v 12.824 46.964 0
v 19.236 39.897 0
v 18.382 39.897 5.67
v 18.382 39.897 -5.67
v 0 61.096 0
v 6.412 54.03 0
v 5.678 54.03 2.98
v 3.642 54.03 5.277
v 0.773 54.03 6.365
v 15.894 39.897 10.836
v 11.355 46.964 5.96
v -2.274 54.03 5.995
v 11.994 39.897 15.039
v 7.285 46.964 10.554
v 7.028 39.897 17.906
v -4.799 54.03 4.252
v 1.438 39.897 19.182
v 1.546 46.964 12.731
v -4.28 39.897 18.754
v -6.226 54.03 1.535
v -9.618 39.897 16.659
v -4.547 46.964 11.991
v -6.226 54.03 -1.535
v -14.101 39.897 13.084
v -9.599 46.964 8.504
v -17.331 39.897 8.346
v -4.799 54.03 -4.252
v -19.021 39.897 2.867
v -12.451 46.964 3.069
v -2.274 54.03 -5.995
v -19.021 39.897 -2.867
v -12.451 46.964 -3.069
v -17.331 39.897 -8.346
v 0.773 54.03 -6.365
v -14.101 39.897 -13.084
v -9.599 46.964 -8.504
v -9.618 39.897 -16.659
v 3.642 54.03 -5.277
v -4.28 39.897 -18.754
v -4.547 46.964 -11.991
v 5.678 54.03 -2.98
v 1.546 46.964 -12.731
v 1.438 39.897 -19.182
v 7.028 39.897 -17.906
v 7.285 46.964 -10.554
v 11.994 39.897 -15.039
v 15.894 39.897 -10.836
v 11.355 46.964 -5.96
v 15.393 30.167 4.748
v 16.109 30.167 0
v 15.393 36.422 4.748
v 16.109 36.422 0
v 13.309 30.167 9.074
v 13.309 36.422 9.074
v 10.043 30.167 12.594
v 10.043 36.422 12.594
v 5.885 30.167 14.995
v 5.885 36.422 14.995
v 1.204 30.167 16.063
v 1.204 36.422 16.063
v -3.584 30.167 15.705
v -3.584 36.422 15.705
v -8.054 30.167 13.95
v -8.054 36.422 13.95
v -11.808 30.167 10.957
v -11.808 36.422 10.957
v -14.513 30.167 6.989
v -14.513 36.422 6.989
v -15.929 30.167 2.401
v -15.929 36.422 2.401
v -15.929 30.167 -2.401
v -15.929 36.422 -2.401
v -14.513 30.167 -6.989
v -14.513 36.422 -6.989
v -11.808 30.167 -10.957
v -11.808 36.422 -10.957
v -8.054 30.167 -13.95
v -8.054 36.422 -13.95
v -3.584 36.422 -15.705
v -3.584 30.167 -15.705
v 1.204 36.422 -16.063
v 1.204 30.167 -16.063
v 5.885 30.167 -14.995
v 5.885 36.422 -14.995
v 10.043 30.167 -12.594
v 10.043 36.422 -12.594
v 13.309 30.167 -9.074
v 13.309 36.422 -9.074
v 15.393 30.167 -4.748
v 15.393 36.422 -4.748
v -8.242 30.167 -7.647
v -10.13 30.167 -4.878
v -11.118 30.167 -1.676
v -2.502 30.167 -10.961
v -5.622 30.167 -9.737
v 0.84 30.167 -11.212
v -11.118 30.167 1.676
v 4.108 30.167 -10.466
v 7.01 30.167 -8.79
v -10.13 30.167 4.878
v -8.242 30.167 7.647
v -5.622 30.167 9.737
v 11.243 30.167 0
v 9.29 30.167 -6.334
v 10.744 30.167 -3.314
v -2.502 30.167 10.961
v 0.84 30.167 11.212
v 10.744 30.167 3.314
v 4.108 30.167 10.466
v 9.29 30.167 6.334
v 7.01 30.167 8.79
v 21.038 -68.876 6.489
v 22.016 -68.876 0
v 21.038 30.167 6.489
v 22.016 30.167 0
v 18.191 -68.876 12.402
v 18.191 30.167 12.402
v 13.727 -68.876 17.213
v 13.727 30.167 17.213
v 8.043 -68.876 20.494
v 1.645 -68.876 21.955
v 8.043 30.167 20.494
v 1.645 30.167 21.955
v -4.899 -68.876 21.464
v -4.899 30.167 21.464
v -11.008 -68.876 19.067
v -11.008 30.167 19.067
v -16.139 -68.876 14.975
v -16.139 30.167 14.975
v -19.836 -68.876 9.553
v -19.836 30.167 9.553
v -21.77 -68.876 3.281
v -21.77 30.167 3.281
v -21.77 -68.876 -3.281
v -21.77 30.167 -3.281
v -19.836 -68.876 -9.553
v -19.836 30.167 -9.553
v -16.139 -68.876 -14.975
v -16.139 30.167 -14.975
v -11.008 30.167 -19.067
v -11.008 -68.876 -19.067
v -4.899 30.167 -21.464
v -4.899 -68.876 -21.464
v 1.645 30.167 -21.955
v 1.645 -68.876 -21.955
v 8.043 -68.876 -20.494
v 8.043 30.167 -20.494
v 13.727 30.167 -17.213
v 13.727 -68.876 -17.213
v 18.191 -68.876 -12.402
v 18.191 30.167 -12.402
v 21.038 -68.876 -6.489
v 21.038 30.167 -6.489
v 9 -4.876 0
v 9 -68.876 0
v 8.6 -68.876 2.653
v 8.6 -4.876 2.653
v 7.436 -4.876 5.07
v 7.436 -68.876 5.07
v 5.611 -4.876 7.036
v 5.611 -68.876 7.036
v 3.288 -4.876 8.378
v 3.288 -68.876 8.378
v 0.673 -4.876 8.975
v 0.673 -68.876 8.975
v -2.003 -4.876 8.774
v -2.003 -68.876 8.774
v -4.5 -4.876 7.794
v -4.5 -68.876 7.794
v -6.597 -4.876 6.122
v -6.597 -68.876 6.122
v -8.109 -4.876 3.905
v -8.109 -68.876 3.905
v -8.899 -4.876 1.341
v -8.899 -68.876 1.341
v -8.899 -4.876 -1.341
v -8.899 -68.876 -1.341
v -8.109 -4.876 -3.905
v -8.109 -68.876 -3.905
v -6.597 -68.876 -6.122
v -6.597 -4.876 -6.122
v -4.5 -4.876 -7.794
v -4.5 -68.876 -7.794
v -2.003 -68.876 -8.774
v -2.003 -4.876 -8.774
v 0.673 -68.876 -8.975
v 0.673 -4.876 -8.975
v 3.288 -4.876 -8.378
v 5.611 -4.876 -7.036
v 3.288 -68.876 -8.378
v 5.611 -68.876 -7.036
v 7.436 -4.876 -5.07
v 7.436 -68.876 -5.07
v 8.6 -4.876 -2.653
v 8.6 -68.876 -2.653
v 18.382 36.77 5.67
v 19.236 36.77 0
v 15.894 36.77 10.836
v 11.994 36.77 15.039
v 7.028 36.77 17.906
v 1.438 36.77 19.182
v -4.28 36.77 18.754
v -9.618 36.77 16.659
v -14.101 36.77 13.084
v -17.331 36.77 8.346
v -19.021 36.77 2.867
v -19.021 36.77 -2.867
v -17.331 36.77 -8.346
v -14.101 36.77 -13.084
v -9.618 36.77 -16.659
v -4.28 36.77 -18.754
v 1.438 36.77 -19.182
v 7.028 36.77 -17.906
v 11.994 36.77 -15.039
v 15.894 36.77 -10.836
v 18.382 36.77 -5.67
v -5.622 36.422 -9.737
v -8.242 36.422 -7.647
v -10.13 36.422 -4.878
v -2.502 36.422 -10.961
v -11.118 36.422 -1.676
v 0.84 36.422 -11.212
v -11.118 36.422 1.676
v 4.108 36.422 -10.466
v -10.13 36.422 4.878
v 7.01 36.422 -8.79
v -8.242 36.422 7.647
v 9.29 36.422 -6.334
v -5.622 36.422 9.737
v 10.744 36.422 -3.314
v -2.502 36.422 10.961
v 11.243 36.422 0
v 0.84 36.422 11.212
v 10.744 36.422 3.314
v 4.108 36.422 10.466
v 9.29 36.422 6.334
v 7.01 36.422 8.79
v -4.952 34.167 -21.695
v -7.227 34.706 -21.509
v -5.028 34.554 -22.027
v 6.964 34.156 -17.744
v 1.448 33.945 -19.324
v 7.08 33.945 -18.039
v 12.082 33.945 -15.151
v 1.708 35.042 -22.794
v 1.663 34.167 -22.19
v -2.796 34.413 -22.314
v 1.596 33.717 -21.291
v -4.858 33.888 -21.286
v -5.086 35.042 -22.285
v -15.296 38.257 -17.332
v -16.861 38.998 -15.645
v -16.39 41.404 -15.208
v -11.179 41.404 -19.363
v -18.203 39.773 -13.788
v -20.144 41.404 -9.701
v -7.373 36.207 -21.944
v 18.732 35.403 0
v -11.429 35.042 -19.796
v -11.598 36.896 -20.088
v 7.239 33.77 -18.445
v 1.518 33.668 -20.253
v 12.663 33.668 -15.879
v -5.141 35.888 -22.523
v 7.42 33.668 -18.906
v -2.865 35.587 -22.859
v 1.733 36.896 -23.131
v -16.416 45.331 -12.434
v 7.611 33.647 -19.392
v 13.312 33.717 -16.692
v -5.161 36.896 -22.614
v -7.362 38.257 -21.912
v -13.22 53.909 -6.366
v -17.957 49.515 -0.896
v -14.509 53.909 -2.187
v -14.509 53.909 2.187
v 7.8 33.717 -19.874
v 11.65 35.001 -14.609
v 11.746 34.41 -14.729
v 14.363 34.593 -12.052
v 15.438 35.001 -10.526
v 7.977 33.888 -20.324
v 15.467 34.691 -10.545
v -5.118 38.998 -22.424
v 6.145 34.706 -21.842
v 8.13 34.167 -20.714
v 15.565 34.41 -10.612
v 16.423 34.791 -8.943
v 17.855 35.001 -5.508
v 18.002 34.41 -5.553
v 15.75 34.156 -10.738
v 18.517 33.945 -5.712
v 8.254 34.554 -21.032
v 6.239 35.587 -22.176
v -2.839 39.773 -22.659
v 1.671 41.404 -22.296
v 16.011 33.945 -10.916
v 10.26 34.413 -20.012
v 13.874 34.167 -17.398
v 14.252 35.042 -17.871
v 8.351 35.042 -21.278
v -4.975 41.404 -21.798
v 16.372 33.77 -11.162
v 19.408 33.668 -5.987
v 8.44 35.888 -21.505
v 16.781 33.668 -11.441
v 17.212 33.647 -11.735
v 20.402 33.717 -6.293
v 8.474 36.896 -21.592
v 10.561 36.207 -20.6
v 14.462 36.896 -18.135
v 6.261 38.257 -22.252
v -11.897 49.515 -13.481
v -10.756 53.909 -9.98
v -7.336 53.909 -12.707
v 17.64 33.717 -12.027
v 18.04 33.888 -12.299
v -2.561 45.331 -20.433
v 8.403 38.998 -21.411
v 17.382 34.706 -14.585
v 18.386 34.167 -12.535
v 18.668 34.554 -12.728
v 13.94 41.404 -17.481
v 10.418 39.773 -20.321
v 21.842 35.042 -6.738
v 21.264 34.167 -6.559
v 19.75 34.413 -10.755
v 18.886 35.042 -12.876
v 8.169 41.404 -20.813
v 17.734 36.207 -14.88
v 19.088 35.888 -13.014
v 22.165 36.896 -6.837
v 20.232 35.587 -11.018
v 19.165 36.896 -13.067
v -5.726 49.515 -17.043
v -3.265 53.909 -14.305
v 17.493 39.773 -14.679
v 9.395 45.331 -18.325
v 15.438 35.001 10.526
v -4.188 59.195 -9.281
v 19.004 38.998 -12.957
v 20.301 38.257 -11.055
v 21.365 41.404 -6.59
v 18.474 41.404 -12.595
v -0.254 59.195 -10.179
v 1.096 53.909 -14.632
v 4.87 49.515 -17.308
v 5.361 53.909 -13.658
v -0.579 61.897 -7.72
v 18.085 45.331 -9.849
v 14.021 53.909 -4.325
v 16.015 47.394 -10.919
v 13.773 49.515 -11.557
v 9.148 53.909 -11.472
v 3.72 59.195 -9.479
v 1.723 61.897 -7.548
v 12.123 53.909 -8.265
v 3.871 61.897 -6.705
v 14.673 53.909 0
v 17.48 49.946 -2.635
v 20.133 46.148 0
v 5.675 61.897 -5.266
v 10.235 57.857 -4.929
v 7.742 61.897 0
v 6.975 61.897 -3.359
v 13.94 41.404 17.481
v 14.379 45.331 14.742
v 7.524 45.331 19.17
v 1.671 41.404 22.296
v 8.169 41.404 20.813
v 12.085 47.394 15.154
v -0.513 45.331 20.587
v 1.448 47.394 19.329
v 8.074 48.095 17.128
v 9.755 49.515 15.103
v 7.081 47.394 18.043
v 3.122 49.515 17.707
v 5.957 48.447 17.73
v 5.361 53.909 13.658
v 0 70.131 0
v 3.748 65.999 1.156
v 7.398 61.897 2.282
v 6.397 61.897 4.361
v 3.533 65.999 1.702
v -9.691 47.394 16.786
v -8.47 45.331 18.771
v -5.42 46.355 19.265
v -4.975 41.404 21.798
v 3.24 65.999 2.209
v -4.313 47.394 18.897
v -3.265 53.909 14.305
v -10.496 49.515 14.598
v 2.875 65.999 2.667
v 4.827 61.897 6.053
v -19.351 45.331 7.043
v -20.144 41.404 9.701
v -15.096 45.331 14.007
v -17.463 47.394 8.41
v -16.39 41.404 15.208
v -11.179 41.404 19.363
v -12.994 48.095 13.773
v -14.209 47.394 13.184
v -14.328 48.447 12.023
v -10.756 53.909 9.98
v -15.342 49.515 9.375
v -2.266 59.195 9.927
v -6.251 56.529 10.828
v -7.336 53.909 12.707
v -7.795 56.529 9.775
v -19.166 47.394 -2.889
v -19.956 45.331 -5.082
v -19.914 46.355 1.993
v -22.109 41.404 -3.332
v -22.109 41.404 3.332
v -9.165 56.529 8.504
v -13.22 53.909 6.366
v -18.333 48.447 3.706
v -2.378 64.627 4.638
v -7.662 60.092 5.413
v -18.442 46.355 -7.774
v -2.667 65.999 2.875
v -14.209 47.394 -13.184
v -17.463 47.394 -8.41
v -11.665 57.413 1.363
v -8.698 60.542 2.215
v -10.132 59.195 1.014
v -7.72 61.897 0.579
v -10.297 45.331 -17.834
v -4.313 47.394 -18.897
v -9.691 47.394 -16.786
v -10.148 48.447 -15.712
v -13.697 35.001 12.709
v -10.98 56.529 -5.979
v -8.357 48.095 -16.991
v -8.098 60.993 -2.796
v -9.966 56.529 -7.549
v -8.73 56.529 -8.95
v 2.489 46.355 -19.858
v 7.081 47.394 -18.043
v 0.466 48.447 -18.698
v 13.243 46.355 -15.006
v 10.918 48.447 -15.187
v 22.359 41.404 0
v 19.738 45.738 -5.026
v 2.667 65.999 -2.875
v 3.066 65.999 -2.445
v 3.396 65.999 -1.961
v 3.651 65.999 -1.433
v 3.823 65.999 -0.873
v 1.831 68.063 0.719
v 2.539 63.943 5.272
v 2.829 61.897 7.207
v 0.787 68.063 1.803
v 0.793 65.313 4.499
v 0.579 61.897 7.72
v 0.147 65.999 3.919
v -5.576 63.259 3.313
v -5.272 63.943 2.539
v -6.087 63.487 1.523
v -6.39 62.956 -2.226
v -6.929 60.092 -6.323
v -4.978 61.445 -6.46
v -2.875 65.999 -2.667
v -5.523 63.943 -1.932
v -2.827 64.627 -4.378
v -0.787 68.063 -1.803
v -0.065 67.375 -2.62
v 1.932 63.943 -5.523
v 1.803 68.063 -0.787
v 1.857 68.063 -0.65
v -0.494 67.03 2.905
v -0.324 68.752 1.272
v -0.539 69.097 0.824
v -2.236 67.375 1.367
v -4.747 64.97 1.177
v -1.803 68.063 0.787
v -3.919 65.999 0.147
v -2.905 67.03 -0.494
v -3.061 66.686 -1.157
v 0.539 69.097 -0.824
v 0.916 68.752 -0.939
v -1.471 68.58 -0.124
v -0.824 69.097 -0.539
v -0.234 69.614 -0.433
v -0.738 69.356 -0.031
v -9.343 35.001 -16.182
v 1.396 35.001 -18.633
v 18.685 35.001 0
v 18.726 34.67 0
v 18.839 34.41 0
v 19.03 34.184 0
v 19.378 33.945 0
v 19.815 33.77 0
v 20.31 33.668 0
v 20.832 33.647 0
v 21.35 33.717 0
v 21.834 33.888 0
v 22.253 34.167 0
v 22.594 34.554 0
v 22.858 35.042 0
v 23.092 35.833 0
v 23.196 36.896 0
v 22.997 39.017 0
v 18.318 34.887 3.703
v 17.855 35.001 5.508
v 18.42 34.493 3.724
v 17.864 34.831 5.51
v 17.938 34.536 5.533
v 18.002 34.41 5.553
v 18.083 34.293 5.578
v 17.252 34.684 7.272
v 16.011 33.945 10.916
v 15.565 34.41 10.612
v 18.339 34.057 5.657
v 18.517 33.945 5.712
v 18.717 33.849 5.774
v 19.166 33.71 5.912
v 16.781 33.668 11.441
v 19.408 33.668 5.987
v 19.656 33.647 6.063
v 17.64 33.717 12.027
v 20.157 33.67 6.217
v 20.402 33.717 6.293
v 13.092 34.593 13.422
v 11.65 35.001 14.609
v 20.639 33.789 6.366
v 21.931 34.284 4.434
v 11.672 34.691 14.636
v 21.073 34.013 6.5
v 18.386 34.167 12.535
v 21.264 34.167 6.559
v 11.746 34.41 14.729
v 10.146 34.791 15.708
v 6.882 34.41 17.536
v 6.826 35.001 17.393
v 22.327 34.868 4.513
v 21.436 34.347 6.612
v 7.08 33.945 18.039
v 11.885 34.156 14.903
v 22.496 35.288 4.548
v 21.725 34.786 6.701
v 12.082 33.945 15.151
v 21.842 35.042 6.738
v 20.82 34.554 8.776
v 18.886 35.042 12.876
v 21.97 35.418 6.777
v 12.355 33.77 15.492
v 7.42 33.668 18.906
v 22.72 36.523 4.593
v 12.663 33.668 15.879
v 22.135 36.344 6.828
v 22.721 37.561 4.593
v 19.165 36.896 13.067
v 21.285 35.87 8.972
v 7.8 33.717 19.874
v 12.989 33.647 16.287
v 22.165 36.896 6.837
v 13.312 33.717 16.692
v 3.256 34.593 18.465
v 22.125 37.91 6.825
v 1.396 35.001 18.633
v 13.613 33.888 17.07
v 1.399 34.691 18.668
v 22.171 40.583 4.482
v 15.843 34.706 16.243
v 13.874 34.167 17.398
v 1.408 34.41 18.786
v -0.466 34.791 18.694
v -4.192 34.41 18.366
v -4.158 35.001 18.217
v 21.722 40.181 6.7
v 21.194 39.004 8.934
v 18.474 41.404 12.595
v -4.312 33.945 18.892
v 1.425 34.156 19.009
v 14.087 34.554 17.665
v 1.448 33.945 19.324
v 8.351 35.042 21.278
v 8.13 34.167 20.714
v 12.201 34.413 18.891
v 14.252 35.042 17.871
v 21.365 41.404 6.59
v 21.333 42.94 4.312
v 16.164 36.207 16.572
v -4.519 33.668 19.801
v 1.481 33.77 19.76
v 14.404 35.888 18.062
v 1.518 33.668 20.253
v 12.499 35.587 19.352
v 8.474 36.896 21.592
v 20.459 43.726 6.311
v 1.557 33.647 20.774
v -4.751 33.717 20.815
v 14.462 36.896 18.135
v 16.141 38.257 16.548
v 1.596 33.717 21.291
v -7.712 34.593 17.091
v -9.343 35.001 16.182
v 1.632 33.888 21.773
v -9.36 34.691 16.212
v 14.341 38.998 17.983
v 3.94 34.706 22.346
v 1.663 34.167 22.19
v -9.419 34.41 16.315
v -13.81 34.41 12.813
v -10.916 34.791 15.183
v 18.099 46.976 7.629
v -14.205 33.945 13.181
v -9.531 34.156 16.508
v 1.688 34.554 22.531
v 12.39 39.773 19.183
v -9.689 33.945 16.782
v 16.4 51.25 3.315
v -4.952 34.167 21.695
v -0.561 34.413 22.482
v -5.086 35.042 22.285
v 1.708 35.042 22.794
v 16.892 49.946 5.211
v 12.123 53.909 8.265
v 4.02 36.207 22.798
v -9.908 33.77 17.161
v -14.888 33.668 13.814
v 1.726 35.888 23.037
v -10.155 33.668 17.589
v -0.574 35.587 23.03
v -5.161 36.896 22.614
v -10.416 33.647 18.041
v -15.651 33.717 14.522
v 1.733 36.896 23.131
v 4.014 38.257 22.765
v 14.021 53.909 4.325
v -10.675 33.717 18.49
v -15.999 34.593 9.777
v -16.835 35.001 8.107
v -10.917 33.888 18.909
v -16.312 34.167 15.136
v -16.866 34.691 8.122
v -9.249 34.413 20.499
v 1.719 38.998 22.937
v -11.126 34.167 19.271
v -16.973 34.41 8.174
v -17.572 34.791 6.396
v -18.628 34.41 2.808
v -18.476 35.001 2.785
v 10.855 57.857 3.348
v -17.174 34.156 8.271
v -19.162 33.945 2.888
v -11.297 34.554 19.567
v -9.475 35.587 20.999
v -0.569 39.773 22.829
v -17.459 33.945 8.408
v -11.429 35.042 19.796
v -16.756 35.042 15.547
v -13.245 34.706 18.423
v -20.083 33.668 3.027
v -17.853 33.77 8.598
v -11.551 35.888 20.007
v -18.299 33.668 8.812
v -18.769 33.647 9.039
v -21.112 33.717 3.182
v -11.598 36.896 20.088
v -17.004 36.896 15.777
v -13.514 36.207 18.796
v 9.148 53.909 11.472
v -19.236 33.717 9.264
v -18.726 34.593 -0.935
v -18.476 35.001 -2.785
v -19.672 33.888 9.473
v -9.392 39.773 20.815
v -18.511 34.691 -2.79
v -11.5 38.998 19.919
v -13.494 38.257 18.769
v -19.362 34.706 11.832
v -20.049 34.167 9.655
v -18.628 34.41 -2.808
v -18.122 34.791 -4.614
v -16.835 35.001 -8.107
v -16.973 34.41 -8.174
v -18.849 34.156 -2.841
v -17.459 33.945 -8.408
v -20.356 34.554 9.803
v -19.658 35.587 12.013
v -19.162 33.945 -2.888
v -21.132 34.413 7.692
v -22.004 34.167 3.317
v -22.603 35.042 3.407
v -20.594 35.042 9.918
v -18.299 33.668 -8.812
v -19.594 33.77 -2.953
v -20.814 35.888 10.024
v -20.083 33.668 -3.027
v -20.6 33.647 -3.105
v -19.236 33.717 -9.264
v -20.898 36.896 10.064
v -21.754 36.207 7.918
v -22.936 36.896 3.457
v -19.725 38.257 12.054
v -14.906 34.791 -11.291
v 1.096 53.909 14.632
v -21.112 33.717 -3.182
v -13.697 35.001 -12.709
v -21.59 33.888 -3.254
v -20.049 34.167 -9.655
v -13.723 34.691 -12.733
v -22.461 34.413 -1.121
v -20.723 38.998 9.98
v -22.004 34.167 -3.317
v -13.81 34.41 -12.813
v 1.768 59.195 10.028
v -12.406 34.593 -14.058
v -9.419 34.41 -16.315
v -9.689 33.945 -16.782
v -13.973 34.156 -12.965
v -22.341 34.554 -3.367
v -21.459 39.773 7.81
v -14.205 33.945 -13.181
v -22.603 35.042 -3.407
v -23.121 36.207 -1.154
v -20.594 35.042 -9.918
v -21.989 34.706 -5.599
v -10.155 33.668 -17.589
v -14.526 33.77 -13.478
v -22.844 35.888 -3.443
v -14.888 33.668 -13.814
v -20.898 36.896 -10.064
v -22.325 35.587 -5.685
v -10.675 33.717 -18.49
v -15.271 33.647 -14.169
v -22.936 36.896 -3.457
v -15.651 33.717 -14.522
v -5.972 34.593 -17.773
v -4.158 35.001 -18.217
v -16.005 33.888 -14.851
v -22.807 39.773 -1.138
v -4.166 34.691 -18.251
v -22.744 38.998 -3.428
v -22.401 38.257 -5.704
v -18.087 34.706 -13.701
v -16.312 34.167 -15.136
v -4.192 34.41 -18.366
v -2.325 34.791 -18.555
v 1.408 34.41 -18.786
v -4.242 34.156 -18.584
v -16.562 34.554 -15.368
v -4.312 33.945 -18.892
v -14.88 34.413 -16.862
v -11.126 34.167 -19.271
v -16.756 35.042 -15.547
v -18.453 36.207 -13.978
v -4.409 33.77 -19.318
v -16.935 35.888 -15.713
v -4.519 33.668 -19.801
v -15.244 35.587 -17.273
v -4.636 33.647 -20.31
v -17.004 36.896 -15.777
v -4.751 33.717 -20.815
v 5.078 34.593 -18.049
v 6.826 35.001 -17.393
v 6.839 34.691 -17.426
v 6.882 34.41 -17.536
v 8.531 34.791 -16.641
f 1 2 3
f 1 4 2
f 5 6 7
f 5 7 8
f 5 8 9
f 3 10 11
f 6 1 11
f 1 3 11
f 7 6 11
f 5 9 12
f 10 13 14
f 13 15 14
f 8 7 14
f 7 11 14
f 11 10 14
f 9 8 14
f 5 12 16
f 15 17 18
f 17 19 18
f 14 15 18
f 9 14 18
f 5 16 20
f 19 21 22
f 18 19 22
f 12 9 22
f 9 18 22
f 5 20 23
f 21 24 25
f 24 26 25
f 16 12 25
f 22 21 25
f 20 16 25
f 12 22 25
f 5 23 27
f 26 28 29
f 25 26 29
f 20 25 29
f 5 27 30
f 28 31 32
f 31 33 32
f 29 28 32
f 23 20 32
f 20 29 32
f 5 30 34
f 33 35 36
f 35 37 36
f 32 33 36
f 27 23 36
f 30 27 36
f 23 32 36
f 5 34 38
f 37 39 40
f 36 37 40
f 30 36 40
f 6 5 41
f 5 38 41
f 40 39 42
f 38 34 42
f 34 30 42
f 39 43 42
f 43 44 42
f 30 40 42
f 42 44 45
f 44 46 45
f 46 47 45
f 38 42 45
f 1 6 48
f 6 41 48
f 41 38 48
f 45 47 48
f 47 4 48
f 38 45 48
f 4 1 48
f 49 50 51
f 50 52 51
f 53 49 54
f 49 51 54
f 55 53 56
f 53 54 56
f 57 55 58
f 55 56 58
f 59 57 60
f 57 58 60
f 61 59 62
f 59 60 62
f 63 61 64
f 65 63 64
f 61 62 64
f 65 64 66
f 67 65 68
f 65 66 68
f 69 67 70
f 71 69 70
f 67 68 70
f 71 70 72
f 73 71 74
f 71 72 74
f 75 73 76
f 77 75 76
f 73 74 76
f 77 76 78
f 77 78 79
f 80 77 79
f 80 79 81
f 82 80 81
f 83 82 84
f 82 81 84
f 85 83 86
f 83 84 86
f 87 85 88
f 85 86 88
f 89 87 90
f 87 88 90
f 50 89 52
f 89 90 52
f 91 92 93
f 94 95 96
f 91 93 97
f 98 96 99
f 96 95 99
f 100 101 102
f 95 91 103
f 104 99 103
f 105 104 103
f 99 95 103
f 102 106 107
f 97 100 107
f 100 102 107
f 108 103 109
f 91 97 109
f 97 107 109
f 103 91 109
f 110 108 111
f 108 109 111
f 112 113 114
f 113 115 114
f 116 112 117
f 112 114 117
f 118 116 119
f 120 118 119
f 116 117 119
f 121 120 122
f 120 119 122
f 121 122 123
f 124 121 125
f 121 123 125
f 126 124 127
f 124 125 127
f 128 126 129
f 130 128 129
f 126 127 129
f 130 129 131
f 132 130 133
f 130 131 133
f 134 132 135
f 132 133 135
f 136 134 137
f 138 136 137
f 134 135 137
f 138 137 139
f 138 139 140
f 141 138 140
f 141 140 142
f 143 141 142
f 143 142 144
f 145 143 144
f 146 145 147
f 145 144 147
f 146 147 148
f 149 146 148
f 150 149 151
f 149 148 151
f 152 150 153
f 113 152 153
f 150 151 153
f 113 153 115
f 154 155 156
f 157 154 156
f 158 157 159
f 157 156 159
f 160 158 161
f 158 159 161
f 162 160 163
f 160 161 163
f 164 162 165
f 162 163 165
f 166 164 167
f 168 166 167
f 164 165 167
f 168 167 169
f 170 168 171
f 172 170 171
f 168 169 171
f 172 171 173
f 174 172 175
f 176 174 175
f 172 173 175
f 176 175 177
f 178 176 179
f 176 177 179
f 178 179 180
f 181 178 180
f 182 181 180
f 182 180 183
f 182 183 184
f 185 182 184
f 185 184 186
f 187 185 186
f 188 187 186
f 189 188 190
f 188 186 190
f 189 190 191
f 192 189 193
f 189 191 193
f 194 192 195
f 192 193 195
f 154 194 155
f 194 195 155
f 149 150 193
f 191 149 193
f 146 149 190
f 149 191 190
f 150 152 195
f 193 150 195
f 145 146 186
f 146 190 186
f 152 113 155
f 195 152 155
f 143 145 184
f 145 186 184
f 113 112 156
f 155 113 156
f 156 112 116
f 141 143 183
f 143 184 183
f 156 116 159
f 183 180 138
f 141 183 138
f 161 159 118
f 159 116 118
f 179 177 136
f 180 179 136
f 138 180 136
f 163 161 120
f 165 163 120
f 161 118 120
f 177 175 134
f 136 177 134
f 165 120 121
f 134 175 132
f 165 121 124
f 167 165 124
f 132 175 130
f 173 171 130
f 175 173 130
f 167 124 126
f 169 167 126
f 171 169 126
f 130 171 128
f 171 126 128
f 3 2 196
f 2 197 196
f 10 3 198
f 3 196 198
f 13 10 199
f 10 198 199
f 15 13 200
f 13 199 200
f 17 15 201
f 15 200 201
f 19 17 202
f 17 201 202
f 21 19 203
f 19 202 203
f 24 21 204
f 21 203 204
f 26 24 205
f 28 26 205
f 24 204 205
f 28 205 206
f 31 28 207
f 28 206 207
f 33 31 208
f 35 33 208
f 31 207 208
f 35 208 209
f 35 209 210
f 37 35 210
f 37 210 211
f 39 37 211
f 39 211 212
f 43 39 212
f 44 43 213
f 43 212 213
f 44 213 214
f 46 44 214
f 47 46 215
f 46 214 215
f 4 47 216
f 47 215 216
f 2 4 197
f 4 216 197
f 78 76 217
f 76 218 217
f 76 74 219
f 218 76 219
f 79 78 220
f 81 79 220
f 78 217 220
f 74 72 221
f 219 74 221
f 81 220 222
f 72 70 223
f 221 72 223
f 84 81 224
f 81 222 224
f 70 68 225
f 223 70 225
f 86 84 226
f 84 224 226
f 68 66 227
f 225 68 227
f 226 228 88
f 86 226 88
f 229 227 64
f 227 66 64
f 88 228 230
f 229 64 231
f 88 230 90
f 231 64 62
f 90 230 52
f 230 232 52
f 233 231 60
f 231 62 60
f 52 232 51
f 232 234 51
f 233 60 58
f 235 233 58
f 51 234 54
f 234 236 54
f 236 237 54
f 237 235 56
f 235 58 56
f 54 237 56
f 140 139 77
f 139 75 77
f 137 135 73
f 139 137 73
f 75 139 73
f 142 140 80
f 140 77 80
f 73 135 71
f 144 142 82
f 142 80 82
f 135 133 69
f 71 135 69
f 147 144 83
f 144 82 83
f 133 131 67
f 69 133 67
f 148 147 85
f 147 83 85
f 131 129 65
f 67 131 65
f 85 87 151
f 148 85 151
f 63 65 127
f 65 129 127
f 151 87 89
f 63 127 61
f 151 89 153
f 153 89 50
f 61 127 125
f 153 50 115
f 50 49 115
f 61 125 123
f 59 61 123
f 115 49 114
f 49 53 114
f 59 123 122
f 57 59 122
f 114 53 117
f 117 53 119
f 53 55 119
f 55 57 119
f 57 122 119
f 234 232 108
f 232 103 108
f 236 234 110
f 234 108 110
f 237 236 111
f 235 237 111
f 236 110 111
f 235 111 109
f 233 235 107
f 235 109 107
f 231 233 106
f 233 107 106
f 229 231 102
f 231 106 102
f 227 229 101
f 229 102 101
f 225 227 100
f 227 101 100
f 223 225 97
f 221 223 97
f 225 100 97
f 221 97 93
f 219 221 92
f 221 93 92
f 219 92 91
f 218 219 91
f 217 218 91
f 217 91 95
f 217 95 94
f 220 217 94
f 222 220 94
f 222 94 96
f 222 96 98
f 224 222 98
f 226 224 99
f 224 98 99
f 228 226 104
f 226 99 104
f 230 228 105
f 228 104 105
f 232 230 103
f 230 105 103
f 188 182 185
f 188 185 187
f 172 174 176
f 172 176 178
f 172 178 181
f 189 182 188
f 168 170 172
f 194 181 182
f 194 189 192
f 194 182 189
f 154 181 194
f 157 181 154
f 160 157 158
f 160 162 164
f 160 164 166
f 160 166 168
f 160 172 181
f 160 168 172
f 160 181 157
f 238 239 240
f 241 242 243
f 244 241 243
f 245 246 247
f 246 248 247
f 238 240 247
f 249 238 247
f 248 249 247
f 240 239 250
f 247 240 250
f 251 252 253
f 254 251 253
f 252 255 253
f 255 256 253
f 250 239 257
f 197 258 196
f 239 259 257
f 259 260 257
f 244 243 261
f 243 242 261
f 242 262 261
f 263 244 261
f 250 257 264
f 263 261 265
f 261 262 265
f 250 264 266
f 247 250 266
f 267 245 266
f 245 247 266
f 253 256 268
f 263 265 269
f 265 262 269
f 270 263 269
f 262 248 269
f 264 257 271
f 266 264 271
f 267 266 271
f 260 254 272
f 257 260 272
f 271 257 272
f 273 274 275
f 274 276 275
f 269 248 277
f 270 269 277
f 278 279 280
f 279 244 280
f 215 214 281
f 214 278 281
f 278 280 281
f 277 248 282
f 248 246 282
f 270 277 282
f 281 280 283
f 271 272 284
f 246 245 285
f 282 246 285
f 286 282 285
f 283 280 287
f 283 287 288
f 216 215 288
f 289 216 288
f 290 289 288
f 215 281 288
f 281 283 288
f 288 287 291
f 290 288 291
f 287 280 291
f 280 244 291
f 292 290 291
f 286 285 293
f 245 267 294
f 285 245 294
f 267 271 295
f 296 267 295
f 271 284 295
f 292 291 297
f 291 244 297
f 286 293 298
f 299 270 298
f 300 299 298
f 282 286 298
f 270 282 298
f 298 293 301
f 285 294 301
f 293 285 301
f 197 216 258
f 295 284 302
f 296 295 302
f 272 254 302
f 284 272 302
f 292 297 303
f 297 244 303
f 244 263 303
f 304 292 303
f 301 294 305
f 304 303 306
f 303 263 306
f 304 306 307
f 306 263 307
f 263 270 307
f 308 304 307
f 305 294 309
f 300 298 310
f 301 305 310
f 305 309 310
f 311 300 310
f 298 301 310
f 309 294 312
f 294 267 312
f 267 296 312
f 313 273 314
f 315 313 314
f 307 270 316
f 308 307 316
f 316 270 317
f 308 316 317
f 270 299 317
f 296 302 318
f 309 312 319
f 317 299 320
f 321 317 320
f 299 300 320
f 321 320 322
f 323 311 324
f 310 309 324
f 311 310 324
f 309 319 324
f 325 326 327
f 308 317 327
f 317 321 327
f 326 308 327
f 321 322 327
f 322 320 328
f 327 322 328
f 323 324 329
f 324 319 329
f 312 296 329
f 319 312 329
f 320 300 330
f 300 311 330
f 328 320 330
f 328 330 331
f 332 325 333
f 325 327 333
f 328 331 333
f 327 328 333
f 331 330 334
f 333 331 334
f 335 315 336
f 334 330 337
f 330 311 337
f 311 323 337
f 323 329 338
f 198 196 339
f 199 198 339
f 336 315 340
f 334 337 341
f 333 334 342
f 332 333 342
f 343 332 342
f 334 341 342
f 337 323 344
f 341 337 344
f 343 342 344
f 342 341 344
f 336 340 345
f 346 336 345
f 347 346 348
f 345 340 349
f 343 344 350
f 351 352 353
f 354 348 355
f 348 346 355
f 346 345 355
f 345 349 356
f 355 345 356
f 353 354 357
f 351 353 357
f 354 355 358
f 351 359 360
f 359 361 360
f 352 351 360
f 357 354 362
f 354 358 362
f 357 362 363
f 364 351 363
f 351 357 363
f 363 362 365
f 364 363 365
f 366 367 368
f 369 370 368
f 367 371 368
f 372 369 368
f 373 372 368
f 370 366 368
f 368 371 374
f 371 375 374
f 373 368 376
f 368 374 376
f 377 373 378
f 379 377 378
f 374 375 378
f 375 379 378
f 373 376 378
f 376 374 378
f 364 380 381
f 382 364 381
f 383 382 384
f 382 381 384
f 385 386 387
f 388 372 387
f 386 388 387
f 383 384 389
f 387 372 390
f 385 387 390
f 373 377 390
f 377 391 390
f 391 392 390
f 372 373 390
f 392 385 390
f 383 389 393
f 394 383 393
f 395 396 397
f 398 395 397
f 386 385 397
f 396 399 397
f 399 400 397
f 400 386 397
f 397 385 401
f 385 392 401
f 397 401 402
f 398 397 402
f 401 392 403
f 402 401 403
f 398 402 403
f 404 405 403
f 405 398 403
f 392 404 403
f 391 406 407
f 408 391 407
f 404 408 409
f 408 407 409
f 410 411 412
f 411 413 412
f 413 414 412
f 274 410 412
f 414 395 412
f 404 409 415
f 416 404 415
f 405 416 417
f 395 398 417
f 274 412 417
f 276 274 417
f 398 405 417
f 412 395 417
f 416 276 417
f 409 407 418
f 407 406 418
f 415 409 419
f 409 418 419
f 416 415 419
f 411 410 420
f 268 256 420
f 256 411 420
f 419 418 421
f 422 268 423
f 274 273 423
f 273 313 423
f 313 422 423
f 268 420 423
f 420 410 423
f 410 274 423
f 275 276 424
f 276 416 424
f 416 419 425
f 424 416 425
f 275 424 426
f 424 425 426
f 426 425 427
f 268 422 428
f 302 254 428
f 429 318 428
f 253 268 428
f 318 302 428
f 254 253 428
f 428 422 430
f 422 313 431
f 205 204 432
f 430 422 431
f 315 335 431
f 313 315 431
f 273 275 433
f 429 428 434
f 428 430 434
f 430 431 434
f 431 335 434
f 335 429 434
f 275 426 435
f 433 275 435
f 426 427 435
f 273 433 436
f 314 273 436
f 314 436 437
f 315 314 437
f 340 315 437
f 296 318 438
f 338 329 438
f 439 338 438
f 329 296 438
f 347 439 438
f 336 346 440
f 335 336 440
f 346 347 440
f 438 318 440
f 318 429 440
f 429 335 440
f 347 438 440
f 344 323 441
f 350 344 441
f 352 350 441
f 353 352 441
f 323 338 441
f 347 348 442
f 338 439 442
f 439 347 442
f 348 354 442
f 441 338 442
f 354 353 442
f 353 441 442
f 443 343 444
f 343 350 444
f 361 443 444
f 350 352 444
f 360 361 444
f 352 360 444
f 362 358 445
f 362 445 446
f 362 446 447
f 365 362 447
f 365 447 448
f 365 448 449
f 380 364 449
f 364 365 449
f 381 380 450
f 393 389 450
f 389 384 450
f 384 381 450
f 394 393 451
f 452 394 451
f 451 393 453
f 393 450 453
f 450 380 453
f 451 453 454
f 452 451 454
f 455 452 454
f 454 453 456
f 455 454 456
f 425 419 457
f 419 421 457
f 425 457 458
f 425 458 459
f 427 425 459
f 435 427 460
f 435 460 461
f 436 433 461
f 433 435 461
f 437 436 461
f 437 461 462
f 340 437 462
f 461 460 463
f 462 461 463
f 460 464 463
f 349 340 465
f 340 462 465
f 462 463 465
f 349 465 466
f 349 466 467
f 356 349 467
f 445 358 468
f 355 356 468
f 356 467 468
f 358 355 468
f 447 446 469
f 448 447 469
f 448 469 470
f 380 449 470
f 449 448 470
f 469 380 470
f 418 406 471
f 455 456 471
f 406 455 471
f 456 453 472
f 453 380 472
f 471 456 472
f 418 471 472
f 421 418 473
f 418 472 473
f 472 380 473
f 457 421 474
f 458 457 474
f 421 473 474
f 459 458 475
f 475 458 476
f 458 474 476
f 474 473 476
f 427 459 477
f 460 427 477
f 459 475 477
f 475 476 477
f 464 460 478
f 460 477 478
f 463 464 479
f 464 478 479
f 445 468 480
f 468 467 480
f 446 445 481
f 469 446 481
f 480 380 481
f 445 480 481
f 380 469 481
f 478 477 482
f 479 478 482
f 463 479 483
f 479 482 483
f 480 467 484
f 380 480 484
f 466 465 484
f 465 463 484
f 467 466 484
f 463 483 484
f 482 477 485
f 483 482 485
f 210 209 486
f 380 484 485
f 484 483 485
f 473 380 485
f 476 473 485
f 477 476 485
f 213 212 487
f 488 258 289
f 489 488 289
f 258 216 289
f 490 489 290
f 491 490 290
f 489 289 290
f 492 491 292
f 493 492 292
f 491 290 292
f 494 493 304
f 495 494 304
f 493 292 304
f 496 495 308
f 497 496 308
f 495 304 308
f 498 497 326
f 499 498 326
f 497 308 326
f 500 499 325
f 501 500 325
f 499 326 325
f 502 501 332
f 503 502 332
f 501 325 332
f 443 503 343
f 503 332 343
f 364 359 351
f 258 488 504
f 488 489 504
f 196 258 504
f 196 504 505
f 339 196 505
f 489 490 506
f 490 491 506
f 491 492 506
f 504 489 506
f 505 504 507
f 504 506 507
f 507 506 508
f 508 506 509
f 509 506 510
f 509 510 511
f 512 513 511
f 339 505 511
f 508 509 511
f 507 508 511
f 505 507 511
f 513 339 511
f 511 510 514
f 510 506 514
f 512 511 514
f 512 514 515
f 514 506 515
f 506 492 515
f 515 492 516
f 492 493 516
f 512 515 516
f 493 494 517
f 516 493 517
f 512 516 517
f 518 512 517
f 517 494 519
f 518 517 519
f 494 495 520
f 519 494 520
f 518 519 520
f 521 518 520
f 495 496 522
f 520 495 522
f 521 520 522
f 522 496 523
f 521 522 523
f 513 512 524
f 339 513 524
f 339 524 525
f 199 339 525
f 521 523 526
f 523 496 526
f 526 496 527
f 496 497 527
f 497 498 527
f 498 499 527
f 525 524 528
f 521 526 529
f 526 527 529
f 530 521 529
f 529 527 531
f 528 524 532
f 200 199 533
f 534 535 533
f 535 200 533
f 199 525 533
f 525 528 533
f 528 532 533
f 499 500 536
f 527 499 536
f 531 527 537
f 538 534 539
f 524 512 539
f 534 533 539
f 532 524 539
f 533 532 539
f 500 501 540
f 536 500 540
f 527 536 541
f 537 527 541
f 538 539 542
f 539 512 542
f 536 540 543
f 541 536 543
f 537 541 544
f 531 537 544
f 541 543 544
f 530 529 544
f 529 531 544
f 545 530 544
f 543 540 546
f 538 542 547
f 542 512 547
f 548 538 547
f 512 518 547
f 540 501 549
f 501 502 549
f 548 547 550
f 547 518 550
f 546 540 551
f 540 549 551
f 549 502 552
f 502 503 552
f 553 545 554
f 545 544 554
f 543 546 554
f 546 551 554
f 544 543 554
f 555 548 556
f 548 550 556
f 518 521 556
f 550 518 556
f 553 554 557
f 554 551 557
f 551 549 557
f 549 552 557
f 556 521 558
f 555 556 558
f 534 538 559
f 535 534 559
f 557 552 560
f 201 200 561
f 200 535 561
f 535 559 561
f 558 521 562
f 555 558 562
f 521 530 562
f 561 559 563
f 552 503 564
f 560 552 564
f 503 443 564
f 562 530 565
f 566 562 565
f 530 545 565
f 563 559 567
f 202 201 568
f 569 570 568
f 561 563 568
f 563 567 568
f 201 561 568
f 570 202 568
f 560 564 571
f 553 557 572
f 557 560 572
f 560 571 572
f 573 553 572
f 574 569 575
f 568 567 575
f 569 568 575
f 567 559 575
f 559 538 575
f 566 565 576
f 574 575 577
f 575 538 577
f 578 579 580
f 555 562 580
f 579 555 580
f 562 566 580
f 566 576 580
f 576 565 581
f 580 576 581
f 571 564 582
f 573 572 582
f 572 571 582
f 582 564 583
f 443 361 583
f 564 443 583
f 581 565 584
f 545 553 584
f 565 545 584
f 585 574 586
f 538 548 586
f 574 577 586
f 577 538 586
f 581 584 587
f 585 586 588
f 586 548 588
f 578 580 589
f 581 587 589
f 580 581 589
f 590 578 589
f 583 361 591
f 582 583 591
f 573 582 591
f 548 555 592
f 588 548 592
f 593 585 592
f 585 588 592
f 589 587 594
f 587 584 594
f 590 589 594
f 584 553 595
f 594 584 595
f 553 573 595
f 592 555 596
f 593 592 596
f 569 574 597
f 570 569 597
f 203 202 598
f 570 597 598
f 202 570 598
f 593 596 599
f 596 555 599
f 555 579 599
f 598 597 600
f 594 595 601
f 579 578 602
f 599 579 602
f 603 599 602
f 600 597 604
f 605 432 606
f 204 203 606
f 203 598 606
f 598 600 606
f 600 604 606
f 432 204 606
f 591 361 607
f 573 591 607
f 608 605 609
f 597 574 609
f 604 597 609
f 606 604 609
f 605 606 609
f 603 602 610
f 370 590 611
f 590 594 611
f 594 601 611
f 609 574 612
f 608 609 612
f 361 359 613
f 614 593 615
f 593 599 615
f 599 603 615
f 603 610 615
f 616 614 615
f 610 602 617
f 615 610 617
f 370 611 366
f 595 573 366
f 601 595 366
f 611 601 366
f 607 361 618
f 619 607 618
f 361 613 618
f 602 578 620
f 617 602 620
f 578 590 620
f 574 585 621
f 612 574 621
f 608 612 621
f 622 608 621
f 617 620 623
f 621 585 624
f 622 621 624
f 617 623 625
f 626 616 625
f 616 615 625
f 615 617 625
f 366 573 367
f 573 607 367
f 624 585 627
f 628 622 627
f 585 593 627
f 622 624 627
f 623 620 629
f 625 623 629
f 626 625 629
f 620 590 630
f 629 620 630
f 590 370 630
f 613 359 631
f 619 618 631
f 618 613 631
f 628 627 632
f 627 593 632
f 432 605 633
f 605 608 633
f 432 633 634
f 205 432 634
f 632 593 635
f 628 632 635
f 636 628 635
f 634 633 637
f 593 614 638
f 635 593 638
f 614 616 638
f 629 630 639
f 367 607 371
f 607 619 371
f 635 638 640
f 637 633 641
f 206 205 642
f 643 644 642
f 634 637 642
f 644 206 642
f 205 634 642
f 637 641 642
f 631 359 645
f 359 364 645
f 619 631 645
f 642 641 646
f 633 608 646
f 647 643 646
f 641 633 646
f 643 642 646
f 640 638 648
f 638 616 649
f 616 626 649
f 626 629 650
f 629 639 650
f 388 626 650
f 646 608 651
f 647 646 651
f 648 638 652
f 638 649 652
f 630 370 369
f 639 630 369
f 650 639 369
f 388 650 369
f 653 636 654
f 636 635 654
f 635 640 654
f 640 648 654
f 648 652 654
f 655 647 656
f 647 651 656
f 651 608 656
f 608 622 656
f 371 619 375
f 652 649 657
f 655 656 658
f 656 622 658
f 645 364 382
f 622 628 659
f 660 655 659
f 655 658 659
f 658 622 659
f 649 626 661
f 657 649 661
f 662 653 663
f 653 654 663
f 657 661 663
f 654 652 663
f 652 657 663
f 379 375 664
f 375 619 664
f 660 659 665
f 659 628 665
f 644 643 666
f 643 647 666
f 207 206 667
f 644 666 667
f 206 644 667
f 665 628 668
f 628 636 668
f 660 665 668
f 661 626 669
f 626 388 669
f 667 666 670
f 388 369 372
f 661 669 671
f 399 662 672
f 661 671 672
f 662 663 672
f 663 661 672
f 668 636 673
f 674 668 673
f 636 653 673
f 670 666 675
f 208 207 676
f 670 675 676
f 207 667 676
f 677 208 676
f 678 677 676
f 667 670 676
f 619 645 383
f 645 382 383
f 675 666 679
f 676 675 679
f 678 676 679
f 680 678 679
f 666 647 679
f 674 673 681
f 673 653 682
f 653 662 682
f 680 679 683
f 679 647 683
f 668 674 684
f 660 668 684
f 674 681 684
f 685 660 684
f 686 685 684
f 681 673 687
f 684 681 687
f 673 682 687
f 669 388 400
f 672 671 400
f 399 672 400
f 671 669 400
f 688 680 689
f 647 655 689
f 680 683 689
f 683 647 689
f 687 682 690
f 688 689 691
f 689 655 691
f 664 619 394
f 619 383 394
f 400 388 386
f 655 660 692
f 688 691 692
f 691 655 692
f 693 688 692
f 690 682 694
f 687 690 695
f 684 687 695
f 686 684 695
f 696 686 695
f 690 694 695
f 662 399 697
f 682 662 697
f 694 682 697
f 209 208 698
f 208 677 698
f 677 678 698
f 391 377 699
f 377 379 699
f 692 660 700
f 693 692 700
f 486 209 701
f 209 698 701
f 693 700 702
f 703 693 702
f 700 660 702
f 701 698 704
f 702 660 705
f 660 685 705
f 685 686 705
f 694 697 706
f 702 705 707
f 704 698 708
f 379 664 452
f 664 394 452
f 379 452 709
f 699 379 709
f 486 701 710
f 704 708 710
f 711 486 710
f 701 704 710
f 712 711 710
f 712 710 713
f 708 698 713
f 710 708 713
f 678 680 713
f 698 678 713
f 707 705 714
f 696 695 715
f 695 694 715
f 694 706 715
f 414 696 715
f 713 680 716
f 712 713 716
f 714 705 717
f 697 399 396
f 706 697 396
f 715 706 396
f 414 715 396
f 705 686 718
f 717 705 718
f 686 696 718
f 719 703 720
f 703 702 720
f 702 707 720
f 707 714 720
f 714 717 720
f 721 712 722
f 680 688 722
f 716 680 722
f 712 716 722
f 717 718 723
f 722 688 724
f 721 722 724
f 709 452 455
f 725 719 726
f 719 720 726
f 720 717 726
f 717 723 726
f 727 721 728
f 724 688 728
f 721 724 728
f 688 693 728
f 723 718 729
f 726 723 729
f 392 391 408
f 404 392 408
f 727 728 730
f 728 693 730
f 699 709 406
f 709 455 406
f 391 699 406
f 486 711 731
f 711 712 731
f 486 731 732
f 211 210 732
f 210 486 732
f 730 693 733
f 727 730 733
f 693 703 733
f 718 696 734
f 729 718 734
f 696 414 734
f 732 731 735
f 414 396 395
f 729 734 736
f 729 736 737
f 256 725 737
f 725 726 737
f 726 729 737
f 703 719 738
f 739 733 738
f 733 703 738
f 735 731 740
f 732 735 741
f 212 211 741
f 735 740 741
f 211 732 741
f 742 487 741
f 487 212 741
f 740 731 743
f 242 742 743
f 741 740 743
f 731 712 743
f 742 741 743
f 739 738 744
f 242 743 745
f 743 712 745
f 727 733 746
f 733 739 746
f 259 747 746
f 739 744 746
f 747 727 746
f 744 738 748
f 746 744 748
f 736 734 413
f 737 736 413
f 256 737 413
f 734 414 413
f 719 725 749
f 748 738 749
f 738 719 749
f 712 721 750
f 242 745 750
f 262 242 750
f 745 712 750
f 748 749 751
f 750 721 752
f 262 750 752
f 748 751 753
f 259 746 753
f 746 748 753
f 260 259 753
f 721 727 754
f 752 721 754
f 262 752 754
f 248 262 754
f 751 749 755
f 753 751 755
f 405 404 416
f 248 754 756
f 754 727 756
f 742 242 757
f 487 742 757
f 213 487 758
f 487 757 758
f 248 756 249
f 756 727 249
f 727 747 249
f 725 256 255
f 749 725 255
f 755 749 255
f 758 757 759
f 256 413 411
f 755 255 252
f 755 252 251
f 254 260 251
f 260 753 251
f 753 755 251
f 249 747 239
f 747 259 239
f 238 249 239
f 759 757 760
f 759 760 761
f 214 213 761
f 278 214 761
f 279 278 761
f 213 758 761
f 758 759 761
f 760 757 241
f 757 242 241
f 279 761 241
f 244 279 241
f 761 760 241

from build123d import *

# Parameters (mm, degrees)
F2_R     = 9
F3_DEPTH = 64


with BuildPart() as f1:
    # F0 (on Top) → F1 (revolve)
    with BuildSketch(Plane.XY):
        with BuildLine():
            add(Edge.make_bspline(
                [(19.2361753434, 36.76969558), (18.8333285398, 35.8557549946), (17.9746011666, 33.9075558501), (23.6675004635, 32.8948803304), (23.4119356032, 45.5381726747), (9.421456798, 60.2345390235), (0, 70.1313540339)],
                knots=[0, 0, 0, 0, 0.1286527276, 0.2742422623, 0.5112608177, 1, 1, 1, 1], degree=3))
            Line((0, 70.1313540339), (0, 61.0959008336))
            Line((0, 61.0959008336), (19.2361753434, 39.897352457))
            Line((19.2361753434, 39.897352457), (19.2361753434, 36.76969558))
        make_face()
    revolve(axis=Axis((0, -0.8392035961, 0), (0, -1, 0)))


with BuildPart() as f1b:
    # F0 (on Top) → F1, piece 2 (revolve)
    with BuildSketch(Plane.XY):
        Polygon((11.2432809547, 30.1668699831), (0, 30.1668699831), (0, -68.8755437732), (22.016312927, -68.8755437732), (22.016312927, 30.1668699831), (16.108520329, 30.1668699831), (16.108520329, 36.4221818745), (11.2432809547, 36.4221818745), align=None)
    revolve(axis=Axis((0, -0.8392035961, 0), (0, -1, 0)))

    # F2 (on face) → F3 (cut)
    with BuildSketch(Plane.XZ.offset(68.8755437732)):
        Circle(F2_R)
    extrude(amount=-F3_DEPTH, mode=Mode.SUBTRACT)


solid = Compound([f1.part, f1b.part])
